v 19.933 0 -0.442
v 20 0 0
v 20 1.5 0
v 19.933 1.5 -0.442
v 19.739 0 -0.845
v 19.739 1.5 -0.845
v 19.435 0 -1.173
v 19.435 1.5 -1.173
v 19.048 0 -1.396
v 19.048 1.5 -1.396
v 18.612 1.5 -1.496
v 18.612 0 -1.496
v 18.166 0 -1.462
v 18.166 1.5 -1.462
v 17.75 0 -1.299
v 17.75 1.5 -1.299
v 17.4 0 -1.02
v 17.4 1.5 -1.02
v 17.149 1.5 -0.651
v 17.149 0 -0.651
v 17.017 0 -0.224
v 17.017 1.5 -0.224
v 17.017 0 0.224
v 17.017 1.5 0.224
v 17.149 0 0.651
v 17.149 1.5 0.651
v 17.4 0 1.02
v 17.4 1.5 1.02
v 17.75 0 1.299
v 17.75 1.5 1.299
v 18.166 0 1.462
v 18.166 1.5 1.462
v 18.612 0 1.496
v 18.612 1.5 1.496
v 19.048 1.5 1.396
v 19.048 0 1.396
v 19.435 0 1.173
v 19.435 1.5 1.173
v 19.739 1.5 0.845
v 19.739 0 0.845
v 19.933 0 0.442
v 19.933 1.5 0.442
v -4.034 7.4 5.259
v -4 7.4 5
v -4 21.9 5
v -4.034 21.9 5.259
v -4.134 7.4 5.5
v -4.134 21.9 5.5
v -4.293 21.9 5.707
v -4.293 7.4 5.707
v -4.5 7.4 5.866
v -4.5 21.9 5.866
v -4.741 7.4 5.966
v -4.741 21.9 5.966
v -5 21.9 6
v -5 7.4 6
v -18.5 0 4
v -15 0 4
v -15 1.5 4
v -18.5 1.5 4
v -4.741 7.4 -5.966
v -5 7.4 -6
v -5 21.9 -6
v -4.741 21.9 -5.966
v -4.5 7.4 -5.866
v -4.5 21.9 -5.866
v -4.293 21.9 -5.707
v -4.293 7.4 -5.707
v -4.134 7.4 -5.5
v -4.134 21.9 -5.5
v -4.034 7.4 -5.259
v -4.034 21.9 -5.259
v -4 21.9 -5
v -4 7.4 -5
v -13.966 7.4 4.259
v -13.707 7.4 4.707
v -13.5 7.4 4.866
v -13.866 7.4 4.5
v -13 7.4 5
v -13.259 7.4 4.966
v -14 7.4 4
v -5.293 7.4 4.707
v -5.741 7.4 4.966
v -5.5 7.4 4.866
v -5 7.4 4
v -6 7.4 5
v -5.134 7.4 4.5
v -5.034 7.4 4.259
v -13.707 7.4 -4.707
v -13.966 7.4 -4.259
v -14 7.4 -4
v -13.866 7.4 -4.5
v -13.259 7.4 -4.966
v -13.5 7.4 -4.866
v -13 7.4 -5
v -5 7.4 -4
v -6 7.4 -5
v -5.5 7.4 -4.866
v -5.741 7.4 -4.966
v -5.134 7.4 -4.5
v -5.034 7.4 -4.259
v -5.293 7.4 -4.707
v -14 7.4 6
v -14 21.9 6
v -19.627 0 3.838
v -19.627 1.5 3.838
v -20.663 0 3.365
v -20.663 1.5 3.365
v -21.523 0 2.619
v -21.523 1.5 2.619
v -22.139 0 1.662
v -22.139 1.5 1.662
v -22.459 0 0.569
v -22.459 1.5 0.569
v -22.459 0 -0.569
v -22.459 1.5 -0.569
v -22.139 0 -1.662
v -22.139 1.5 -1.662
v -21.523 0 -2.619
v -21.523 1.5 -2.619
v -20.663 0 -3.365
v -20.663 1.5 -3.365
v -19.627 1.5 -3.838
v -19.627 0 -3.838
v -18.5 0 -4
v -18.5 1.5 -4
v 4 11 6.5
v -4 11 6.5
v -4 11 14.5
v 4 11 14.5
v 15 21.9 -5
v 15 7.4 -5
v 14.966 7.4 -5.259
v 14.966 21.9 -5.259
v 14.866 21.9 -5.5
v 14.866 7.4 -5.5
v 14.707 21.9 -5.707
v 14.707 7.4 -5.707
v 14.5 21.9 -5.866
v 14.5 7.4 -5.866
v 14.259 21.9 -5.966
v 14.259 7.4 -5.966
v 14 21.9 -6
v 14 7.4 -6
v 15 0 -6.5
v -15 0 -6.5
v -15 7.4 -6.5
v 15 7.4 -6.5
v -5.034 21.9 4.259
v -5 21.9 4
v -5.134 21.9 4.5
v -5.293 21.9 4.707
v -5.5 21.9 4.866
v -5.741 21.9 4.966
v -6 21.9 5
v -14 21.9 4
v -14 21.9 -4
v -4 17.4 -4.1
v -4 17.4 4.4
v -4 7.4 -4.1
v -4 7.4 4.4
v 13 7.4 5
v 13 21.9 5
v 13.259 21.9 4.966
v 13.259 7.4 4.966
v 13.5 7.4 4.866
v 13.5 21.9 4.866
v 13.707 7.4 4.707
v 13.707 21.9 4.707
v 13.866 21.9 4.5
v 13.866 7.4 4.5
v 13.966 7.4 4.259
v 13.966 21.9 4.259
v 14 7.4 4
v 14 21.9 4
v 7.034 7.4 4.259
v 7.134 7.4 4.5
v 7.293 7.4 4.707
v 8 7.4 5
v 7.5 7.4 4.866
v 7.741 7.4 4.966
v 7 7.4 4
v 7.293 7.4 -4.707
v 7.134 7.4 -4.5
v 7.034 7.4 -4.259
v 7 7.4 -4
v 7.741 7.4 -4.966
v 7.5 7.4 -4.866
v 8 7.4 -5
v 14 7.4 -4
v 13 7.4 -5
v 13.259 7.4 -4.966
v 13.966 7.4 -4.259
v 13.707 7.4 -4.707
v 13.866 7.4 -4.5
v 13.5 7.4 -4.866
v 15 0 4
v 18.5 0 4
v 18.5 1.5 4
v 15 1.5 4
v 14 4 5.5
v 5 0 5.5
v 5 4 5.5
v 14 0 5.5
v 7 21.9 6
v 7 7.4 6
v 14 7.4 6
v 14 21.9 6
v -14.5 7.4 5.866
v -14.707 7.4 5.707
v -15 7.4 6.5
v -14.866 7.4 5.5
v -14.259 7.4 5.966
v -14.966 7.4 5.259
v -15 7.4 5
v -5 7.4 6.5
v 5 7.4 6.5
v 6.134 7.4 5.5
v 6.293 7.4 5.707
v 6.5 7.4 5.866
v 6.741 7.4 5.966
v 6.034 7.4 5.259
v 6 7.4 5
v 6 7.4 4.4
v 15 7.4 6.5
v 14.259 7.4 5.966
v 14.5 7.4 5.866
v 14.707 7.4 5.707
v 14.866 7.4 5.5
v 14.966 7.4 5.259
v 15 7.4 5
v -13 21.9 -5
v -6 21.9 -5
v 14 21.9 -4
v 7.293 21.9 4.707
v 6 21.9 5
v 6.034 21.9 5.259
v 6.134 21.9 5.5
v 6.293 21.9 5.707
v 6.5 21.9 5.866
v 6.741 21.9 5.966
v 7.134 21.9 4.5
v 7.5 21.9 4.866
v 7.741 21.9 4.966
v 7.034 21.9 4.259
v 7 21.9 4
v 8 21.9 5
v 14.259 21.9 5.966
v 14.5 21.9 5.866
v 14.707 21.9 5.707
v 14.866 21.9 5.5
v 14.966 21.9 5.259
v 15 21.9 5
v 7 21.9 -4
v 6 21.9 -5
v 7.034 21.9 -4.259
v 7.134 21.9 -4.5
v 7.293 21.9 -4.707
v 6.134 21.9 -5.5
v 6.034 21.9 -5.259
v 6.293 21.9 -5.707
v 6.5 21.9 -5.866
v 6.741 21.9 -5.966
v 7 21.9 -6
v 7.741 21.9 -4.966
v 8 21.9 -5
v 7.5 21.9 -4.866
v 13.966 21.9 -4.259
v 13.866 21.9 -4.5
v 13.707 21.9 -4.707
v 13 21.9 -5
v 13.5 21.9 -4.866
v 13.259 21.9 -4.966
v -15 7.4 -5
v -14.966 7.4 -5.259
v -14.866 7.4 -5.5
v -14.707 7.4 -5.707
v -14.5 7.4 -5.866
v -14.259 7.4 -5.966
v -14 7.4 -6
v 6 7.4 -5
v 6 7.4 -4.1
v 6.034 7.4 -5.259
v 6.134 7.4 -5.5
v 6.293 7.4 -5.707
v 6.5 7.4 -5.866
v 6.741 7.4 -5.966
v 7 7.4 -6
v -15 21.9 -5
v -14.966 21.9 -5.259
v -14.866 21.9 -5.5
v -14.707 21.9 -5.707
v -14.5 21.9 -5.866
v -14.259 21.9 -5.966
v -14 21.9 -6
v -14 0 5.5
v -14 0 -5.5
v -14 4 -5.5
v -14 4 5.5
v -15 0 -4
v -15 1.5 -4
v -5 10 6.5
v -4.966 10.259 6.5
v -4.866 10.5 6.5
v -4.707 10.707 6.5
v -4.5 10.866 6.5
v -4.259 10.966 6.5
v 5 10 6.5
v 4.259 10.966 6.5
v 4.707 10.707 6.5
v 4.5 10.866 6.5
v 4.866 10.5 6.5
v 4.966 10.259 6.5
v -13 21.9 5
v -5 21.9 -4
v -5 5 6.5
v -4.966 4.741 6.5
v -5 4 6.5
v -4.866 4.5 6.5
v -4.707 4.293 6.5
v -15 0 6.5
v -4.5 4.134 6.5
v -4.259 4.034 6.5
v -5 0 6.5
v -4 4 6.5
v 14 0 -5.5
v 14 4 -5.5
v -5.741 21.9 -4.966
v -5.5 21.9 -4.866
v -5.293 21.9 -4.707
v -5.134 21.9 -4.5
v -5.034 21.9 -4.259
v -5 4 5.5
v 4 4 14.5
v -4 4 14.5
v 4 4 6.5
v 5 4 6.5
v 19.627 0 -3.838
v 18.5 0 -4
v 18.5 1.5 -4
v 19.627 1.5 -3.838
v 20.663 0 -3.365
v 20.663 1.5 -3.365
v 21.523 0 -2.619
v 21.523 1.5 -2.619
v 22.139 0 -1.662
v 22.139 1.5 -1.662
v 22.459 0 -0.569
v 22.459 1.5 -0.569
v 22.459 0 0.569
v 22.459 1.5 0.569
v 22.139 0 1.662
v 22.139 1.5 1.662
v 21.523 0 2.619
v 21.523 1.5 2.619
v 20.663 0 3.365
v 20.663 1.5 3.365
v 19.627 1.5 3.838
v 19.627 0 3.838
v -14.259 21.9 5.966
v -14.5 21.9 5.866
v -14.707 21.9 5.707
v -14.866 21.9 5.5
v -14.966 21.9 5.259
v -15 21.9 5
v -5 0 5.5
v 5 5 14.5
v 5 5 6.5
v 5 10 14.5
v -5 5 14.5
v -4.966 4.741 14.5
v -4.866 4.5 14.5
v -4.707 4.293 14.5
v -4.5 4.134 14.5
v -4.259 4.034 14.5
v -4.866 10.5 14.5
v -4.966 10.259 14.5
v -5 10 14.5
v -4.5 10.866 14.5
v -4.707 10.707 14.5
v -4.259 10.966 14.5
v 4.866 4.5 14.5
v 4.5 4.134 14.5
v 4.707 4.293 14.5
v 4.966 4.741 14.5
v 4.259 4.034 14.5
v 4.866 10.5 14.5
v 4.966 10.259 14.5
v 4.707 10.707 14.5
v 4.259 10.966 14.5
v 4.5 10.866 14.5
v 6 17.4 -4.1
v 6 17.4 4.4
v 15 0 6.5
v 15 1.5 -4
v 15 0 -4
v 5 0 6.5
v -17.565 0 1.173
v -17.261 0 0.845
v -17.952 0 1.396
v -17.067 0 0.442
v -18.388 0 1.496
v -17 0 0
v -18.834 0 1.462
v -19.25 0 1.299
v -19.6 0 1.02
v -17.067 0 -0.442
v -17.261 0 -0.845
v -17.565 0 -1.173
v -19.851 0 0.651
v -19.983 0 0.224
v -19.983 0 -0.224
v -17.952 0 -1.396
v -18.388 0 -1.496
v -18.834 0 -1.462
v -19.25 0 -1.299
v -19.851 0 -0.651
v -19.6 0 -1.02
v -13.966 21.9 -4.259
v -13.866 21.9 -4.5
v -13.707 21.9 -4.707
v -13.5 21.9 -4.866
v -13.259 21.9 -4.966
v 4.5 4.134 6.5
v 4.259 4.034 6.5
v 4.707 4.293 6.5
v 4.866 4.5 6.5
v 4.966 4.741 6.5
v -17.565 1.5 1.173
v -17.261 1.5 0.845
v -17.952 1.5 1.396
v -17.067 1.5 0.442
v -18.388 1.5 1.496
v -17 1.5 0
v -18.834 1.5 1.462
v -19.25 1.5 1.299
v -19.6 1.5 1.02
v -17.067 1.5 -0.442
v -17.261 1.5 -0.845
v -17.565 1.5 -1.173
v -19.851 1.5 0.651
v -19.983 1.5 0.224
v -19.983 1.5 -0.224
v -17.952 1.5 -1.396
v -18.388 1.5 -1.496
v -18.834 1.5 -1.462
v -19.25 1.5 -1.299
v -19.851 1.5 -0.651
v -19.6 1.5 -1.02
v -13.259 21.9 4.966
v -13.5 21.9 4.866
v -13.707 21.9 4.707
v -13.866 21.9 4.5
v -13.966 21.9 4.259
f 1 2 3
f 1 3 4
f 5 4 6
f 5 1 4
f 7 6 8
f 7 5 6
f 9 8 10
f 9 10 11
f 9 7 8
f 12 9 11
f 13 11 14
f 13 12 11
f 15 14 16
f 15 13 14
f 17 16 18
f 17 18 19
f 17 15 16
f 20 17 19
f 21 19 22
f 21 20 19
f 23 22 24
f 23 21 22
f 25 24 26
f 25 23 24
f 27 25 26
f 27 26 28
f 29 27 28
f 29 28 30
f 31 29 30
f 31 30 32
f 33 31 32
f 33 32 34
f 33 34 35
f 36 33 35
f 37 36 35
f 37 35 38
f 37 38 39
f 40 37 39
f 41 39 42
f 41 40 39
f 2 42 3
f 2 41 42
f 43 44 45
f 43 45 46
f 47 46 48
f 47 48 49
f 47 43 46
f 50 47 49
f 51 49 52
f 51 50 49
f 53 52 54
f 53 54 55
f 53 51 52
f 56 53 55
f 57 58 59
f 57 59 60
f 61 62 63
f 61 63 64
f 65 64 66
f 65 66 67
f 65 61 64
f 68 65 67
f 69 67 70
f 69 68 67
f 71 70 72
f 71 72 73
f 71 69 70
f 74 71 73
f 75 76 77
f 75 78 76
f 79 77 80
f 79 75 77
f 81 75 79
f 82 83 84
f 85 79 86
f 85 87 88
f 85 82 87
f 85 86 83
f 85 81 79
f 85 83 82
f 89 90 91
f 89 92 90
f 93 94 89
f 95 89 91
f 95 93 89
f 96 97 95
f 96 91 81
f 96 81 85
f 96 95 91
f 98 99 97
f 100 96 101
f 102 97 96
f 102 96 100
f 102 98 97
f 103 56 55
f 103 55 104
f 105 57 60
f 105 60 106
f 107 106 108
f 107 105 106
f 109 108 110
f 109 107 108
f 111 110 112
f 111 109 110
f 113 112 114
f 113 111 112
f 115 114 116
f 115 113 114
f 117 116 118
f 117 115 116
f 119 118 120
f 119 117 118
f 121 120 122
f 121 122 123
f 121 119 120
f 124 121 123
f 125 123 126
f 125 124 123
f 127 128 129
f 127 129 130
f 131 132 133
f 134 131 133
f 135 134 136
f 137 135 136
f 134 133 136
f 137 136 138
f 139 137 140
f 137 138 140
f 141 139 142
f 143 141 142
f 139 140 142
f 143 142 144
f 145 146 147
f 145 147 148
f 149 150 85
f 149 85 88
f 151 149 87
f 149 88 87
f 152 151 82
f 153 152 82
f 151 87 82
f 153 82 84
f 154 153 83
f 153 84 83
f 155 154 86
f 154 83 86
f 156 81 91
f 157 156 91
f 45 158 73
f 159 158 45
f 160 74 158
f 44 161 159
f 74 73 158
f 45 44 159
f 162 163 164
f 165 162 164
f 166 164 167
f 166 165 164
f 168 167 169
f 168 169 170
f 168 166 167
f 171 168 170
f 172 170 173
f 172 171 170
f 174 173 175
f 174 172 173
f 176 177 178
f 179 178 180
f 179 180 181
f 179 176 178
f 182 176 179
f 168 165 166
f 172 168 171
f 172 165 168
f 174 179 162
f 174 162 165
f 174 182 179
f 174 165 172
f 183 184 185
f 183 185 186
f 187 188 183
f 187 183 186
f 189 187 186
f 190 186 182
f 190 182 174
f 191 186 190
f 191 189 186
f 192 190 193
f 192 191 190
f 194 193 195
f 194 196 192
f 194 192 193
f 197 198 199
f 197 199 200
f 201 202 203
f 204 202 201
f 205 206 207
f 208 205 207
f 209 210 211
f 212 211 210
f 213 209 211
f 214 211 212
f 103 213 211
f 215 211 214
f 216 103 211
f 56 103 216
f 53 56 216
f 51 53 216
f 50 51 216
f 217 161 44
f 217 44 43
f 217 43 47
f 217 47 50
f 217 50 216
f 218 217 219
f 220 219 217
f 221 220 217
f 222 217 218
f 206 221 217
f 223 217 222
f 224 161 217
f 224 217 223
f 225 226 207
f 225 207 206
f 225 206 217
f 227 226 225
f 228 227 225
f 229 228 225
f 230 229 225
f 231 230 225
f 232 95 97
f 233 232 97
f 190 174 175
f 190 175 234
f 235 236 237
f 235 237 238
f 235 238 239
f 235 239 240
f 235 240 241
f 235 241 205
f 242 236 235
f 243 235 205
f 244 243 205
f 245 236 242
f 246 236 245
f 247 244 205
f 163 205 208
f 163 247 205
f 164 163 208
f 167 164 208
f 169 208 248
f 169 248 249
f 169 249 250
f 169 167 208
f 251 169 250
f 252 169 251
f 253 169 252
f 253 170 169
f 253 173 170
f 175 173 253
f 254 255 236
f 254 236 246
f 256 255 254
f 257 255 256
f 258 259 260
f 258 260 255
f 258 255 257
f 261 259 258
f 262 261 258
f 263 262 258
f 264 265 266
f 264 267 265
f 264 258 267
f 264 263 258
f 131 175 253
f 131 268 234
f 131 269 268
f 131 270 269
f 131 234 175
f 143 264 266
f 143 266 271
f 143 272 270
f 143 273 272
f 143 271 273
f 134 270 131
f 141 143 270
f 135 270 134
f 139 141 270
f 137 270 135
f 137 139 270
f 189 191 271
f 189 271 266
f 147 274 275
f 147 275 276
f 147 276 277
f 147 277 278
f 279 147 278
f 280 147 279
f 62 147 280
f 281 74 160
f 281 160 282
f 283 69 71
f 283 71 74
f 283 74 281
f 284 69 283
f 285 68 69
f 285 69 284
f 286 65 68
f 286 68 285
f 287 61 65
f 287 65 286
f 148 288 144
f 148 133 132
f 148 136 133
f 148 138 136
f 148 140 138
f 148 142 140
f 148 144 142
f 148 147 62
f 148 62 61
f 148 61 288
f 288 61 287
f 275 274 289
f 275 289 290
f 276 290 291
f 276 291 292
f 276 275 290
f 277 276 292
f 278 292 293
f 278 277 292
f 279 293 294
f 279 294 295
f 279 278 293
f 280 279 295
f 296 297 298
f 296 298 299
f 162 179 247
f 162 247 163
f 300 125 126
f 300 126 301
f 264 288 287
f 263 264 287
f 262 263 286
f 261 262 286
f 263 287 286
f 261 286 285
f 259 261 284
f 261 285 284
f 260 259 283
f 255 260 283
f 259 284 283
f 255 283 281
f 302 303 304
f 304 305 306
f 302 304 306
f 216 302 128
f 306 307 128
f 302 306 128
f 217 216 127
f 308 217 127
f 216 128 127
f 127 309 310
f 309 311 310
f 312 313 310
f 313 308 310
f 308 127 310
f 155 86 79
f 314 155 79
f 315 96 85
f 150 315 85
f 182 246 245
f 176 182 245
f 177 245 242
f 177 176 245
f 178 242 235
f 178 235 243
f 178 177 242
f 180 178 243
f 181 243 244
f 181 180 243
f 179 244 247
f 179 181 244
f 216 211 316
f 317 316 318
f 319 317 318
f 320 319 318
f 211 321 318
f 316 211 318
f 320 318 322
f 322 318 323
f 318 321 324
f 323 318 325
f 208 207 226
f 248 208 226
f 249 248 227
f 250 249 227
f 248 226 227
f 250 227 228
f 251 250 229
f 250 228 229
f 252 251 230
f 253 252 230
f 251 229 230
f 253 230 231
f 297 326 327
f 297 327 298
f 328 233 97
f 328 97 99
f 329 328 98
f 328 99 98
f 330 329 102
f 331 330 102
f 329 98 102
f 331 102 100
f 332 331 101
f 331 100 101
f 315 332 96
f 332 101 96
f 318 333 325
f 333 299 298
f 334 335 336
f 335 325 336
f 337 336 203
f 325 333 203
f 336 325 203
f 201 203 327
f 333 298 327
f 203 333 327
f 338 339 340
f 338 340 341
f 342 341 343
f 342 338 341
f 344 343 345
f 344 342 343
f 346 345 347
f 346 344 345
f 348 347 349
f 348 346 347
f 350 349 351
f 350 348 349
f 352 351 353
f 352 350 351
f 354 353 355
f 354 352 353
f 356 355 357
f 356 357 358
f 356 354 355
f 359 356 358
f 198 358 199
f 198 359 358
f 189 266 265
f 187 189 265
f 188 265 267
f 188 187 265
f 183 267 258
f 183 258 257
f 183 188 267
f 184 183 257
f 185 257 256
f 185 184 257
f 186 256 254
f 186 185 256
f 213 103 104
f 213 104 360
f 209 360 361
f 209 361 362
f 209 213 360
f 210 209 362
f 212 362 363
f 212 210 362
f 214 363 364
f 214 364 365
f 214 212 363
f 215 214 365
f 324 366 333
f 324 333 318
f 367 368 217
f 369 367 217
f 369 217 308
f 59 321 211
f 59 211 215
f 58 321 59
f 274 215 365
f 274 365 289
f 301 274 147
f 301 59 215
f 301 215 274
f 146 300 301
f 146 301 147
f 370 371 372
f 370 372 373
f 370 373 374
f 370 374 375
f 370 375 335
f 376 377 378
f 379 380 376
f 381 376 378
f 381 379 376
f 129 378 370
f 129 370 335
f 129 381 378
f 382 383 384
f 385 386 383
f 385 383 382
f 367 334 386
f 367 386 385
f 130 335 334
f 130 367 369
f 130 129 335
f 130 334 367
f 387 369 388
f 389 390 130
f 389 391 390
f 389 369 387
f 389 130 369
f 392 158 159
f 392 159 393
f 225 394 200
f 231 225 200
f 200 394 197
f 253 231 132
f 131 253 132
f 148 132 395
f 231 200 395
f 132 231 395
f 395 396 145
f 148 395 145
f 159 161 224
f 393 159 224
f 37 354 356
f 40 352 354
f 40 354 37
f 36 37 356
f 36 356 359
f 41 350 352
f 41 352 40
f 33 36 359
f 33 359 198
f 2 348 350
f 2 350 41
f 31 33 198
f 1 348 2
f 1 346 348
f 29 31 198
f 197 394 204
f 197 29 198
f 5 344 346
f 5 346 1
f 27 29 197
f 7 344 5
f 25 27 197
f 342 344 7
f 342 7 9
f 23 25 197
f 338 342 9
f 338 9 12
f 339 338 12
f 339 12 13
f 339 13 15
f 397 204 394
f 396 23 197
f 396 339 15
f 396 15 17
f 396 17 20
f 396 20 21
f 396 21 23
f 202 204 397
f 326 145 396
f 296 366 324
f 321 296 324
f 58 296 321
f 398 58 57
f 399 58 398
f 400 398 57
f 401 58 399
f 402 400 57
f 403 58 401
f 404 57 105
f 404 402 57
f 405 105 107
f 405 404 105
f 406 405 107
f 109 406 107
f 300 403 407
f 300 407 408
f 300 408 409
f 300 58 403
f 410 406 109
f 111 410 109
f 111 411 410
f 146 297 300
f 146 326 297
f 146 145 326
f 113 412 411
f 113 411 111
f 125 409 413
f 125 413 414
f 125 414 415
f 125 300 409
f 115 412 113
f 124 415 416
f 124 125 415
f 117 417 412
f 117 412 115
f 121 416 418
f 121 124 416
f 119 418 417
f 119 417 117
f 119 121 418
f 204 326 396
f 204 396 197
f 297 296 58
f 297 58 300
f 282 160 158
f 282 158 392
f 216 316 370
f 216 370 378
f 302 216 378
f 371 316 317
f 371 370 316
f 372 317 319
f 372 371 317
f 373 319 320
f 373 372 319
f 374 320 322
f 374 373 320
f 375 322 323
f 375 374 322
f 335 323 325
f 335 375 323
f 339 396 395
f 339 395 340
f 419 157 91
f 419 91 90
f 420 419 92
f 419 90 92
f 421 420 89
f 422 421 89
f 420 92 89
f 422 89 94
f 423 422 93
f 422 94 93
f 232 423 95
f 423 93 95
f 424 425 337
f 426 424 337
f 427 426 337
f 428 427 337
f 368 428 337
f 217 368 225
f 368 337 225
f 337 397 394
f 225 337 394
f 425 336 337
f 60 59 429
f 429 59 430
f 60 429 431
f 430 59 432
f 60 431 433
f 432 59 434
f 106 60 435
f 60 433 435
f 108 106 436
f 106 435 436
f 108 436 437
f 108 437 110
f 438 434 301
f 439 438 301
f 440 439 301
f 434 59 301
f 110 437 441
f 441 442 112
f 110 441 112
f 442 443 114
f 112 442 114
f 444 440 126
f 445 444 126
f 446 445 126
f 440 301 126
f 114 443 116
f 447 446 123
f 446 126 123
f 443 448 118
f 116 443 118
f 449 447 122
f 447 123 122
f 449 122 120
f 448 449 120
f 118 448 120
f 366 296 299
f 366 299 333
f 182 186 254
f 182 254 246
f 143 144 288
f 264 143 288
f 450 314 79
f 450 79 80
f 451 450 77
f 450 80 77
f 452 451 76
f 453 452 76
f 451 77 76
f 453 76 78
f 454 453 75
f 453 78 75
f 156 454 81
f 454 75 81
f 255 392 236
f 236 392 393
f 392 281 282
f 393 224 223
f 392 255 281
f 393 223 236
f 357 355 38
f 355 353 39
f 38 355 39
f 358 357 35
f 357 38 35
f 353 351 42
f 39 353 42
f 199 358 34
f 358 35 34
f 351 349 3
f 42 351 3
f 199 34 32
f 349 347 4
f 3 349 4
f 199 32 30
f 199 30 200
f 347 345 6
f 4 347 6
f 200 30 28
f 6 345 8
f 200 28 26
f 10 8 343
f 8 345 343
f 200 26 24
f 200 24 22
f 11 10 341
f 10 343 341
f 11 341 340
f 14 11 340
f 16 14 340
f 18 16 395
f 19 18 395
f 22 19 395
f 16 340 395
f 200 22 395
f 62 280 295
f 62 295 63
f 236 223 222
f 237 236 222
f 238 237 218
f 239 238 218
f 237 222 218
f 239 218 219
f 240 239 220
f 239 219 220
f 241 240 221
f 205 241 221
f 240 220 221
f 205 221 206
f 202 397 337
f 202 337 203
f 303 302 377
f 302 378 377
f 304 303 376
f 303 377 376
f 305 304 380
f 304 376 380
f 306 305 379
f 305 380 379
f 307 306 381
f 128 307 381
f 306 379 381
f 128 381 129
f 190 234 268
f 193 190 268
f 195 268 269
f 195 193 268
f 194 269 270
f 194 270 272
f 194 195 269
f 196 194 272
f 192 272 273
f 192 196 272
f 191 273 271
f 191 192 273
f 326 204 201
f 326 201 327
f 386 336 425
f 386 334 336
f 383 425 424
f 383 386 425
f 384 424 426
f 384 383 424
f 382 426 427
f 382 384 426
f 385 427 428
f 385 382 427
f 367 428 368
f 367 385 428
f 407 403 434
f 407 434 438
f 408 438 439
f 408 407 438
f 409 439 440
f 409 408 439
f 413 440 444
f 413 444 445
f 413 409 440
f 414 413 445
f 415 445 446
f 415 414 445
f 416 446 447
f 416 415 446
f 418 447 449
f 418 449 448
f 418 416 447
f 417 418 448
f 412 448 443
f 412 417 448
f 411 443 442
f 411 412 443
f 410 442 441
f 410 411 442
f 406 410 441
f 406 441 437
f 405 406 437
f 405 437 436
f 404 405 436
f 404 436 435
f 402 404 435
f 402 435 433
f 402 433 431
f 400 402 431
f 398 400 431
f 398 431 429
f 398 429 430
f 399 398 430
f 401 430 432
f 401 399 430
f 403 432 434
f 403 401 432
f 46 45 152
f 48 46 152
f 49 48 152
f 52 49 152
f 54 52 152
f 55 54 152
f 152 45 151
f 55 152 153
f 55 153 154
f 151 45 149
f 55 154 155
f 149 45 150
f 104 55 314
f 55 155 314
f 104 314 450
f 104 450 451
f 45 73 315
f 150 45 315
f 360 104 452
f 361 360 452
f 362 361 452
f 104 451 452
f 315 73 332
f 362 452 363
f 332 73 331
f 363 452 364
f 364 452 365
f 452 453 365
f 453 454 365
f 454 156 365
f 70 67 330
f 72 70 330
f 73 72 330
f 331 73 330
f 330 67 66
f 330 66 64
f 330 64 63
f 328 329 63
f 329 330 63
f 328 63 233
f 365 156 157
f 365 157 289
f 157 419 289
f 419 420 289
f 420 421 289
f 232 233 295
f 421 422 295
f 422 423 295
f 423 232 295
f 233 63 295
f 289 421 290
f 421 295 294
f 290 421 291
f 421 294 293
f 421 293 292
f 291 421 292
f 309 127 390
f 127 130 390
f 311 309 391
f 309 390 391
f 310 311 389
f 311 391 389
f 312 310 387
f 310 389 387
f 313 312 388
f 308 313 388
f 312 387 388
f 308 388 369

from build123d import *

# Parameters (mm, degrees)
SKETCH1_W           = 30
SKETCH1_H           = 13
BOSS_EXTRUDE1_DEPTH = 7.4
BOSS_EXTRUDE2_DEPTH = 14.5
SKETCH3_W           = 10
SKETCH3_H           = 8.5
BOSS_EXTRUDE3_DEPTH = 10
SKETCH5_R           = 1.5
BOSS_EXTRUDE4_DEPTH = 1.5
CUT_EXTRUDE2_DEPTH  = 4
SKETCH7_W           = 10
SKETCH7_H           = 7
BOSS_EXTRUDE5_DEPTH = 8
FILLET1_R           = 1


with BuildPart() as part:
    # Sketch1 → Boss-Extrude1 (new body)
    with BuildSketch(Plane(origin=(0, 0, 0), x_dir=(1, 0, 0), z_dir=(0, 1, 0))):
        Rectangle(SKETCH1_W, SKETCH1_H)
    extrude(amount=BOSS_EXTRUDE1_DEPTH)

    # Sketch2 → Boss-Extrude2 (add)
    with BuildSketch(Plane(origin=(0, 7.4, 0), x_dir=(1, 0, 0), z_dir=(0, 1, 0))):
        with BuildLine():
            Line((-14, 6), (-5, 6))
            ThreePointArc((-5, 6), (-4.292893219, 5.707106781), (-4, 5))
            Line((-4, 5), (-4, -5))
            ThreePointArc((-4, -5), (-4.292893219, -5.707106781), (-5, -6))
            Line((-5, -6), (-14, -6))
            ThreePointArc((-14, -6), (-14.707106781, -5.707106781), (-15, -5))
            Line((-15, -5), (-15, 5))
            ThreePointArc((-15, 5), (-14.707106781, 5.707106781), (-14, 6))
        make_face()
        with BuildLine():
            Line((-13, 5), (-6, 5))
            ThreePointArc((-6, 5), (-5.292893219, 4.707106781), (-5, 4))
            Line((-5, 4), (-5, -4))
            ThreePointArc((-5, -4), (-5.292893219, -4.707106781), (-6, -5))
            Line((-6, -5), (-13, -5))
            ThreePointArc((-13, -5), (-13.707106781, -4.707106781), (-14, -4))
            Line((-14, -4), (-14, 4))
            ThreePointArc((-14, 4), (-13.707106781, 4.707106781), (-13, 5))
        make_face(mode=Mode.SUBTRACT)
        with BuildLine():
            Line((14, 6), (7, 6))
            ThreePointArc((7, 6), (6.292893219, 5.707106781), (6, 5))
            Line((6, 5), (6, -5))
            ThreePointArc((6, -5), (6.292893219, -5.707106781), (7, -6))
            Line((7, -6), (14, -6))
            ThreePointArc((14, -6), (14.707106781, -5.707106781), (15, -5))
            Line((15, -5), (15, 5))
            ThreePointArc((15, 5), (14.707106781, 5.707106781), (14, 6))
        make_face()
        with BuildLine():
            Line((8, -5), (13, -5))
            ThreePointArc((13, -5), (13.707106781, -4.707106781), (14, -4))
            Line((14, -4), (14, 4))
            ThreePointArc((14, 4), (13.707106781, 4.707106781), (13, 5))
            Line((13, 5), (8, 5))
            ThreePointArc((8, 5), (7.292893219, 4.707106781), (7, 4))
            Line((7, 4), (7, -4))
            ThreePointArc((7, -4), (7.292893219, -4.707106781), (8, -5))
        make_face(mode=Mode.SUBTRACT)
    extrude(amount=BOSS_EXTRUDE2_DEPTH)

    # Sketch3 → Boss-Extrude3 (add)
    with BuildSketch(Plane(origin=(0, 7.4, 0), x_dir=(1, 0, 0), z_dir=(0, 1, 0))):
        with Locations((1, -0.15)):
            Rectangle(SKETCH3_W, SKETCH3_H)
    extrude(amount=BOSS_EXTRUDE3_DEPTH)

    # Sketch5 → Boss-Extrude4 (add)
    with BuildSketch(Plane(origin=(0, 0, 0), x_dir=(1, 0, 0), z_dir=(0, 1, 0))):
        with BuildLine():
            Line((-18.5, 4), (18.5, 4))
            ThreePointArc((18.5, 4), (22.5, 0), (18.5, -4))
            Line((18.5, -4), (-18.5, -4))
            ThreePointArc((-18.5, -4), (-22.5, 0), (-18.5, 4))
        make_face()
        with Locations((-18.5, 0)):
            Circle(SKETCH5_R, mode=Mode.SUBTRACT)
        with Locations((18.5, 0)):
            Circle(SKETCH5_R, mode=Mode.SUBTRACT)
    extrude(amount=BOSS_EXTRUDE4_DEPTH)

    # Sketch6 → Cut-Extrude2 (cut)
    with BuildSketch(Plane.XZ):
        Polygon((-14, 5.5), (-5, 5.5), (-5, 6.5), (5, 6.5), (5, 5.5), (14, 5.5), (14, -5.5), (-14, -5.5), align=None)
    extrude(amount=-CUT_EXTRUDE2_DEPTH, mode=Mode.SUBTRACT)

    # Sketch7 → Boss-Extrude5 (add)
    with BuildSketch(Plane.XY.offset(6.5)):
        with Locations((0, 7.5)):
            Rectangle(SKETCH7_W, SKETCH7_H)
    extrude(amount=BOSS_EXTRUDE5_DEPTH)

    # Fillet1
    fillet1_edges = [part.edges().sort_by_distance(p)[0] for p in [
        (-5, 11, 10.5),
        (-5, 4, 10.5),
        (5, 4, 10.5),
        (5, 11, 10.5),
    ]]
    fillet(fillet1_edges, radius=FILLET1_R)


solid = part.part
